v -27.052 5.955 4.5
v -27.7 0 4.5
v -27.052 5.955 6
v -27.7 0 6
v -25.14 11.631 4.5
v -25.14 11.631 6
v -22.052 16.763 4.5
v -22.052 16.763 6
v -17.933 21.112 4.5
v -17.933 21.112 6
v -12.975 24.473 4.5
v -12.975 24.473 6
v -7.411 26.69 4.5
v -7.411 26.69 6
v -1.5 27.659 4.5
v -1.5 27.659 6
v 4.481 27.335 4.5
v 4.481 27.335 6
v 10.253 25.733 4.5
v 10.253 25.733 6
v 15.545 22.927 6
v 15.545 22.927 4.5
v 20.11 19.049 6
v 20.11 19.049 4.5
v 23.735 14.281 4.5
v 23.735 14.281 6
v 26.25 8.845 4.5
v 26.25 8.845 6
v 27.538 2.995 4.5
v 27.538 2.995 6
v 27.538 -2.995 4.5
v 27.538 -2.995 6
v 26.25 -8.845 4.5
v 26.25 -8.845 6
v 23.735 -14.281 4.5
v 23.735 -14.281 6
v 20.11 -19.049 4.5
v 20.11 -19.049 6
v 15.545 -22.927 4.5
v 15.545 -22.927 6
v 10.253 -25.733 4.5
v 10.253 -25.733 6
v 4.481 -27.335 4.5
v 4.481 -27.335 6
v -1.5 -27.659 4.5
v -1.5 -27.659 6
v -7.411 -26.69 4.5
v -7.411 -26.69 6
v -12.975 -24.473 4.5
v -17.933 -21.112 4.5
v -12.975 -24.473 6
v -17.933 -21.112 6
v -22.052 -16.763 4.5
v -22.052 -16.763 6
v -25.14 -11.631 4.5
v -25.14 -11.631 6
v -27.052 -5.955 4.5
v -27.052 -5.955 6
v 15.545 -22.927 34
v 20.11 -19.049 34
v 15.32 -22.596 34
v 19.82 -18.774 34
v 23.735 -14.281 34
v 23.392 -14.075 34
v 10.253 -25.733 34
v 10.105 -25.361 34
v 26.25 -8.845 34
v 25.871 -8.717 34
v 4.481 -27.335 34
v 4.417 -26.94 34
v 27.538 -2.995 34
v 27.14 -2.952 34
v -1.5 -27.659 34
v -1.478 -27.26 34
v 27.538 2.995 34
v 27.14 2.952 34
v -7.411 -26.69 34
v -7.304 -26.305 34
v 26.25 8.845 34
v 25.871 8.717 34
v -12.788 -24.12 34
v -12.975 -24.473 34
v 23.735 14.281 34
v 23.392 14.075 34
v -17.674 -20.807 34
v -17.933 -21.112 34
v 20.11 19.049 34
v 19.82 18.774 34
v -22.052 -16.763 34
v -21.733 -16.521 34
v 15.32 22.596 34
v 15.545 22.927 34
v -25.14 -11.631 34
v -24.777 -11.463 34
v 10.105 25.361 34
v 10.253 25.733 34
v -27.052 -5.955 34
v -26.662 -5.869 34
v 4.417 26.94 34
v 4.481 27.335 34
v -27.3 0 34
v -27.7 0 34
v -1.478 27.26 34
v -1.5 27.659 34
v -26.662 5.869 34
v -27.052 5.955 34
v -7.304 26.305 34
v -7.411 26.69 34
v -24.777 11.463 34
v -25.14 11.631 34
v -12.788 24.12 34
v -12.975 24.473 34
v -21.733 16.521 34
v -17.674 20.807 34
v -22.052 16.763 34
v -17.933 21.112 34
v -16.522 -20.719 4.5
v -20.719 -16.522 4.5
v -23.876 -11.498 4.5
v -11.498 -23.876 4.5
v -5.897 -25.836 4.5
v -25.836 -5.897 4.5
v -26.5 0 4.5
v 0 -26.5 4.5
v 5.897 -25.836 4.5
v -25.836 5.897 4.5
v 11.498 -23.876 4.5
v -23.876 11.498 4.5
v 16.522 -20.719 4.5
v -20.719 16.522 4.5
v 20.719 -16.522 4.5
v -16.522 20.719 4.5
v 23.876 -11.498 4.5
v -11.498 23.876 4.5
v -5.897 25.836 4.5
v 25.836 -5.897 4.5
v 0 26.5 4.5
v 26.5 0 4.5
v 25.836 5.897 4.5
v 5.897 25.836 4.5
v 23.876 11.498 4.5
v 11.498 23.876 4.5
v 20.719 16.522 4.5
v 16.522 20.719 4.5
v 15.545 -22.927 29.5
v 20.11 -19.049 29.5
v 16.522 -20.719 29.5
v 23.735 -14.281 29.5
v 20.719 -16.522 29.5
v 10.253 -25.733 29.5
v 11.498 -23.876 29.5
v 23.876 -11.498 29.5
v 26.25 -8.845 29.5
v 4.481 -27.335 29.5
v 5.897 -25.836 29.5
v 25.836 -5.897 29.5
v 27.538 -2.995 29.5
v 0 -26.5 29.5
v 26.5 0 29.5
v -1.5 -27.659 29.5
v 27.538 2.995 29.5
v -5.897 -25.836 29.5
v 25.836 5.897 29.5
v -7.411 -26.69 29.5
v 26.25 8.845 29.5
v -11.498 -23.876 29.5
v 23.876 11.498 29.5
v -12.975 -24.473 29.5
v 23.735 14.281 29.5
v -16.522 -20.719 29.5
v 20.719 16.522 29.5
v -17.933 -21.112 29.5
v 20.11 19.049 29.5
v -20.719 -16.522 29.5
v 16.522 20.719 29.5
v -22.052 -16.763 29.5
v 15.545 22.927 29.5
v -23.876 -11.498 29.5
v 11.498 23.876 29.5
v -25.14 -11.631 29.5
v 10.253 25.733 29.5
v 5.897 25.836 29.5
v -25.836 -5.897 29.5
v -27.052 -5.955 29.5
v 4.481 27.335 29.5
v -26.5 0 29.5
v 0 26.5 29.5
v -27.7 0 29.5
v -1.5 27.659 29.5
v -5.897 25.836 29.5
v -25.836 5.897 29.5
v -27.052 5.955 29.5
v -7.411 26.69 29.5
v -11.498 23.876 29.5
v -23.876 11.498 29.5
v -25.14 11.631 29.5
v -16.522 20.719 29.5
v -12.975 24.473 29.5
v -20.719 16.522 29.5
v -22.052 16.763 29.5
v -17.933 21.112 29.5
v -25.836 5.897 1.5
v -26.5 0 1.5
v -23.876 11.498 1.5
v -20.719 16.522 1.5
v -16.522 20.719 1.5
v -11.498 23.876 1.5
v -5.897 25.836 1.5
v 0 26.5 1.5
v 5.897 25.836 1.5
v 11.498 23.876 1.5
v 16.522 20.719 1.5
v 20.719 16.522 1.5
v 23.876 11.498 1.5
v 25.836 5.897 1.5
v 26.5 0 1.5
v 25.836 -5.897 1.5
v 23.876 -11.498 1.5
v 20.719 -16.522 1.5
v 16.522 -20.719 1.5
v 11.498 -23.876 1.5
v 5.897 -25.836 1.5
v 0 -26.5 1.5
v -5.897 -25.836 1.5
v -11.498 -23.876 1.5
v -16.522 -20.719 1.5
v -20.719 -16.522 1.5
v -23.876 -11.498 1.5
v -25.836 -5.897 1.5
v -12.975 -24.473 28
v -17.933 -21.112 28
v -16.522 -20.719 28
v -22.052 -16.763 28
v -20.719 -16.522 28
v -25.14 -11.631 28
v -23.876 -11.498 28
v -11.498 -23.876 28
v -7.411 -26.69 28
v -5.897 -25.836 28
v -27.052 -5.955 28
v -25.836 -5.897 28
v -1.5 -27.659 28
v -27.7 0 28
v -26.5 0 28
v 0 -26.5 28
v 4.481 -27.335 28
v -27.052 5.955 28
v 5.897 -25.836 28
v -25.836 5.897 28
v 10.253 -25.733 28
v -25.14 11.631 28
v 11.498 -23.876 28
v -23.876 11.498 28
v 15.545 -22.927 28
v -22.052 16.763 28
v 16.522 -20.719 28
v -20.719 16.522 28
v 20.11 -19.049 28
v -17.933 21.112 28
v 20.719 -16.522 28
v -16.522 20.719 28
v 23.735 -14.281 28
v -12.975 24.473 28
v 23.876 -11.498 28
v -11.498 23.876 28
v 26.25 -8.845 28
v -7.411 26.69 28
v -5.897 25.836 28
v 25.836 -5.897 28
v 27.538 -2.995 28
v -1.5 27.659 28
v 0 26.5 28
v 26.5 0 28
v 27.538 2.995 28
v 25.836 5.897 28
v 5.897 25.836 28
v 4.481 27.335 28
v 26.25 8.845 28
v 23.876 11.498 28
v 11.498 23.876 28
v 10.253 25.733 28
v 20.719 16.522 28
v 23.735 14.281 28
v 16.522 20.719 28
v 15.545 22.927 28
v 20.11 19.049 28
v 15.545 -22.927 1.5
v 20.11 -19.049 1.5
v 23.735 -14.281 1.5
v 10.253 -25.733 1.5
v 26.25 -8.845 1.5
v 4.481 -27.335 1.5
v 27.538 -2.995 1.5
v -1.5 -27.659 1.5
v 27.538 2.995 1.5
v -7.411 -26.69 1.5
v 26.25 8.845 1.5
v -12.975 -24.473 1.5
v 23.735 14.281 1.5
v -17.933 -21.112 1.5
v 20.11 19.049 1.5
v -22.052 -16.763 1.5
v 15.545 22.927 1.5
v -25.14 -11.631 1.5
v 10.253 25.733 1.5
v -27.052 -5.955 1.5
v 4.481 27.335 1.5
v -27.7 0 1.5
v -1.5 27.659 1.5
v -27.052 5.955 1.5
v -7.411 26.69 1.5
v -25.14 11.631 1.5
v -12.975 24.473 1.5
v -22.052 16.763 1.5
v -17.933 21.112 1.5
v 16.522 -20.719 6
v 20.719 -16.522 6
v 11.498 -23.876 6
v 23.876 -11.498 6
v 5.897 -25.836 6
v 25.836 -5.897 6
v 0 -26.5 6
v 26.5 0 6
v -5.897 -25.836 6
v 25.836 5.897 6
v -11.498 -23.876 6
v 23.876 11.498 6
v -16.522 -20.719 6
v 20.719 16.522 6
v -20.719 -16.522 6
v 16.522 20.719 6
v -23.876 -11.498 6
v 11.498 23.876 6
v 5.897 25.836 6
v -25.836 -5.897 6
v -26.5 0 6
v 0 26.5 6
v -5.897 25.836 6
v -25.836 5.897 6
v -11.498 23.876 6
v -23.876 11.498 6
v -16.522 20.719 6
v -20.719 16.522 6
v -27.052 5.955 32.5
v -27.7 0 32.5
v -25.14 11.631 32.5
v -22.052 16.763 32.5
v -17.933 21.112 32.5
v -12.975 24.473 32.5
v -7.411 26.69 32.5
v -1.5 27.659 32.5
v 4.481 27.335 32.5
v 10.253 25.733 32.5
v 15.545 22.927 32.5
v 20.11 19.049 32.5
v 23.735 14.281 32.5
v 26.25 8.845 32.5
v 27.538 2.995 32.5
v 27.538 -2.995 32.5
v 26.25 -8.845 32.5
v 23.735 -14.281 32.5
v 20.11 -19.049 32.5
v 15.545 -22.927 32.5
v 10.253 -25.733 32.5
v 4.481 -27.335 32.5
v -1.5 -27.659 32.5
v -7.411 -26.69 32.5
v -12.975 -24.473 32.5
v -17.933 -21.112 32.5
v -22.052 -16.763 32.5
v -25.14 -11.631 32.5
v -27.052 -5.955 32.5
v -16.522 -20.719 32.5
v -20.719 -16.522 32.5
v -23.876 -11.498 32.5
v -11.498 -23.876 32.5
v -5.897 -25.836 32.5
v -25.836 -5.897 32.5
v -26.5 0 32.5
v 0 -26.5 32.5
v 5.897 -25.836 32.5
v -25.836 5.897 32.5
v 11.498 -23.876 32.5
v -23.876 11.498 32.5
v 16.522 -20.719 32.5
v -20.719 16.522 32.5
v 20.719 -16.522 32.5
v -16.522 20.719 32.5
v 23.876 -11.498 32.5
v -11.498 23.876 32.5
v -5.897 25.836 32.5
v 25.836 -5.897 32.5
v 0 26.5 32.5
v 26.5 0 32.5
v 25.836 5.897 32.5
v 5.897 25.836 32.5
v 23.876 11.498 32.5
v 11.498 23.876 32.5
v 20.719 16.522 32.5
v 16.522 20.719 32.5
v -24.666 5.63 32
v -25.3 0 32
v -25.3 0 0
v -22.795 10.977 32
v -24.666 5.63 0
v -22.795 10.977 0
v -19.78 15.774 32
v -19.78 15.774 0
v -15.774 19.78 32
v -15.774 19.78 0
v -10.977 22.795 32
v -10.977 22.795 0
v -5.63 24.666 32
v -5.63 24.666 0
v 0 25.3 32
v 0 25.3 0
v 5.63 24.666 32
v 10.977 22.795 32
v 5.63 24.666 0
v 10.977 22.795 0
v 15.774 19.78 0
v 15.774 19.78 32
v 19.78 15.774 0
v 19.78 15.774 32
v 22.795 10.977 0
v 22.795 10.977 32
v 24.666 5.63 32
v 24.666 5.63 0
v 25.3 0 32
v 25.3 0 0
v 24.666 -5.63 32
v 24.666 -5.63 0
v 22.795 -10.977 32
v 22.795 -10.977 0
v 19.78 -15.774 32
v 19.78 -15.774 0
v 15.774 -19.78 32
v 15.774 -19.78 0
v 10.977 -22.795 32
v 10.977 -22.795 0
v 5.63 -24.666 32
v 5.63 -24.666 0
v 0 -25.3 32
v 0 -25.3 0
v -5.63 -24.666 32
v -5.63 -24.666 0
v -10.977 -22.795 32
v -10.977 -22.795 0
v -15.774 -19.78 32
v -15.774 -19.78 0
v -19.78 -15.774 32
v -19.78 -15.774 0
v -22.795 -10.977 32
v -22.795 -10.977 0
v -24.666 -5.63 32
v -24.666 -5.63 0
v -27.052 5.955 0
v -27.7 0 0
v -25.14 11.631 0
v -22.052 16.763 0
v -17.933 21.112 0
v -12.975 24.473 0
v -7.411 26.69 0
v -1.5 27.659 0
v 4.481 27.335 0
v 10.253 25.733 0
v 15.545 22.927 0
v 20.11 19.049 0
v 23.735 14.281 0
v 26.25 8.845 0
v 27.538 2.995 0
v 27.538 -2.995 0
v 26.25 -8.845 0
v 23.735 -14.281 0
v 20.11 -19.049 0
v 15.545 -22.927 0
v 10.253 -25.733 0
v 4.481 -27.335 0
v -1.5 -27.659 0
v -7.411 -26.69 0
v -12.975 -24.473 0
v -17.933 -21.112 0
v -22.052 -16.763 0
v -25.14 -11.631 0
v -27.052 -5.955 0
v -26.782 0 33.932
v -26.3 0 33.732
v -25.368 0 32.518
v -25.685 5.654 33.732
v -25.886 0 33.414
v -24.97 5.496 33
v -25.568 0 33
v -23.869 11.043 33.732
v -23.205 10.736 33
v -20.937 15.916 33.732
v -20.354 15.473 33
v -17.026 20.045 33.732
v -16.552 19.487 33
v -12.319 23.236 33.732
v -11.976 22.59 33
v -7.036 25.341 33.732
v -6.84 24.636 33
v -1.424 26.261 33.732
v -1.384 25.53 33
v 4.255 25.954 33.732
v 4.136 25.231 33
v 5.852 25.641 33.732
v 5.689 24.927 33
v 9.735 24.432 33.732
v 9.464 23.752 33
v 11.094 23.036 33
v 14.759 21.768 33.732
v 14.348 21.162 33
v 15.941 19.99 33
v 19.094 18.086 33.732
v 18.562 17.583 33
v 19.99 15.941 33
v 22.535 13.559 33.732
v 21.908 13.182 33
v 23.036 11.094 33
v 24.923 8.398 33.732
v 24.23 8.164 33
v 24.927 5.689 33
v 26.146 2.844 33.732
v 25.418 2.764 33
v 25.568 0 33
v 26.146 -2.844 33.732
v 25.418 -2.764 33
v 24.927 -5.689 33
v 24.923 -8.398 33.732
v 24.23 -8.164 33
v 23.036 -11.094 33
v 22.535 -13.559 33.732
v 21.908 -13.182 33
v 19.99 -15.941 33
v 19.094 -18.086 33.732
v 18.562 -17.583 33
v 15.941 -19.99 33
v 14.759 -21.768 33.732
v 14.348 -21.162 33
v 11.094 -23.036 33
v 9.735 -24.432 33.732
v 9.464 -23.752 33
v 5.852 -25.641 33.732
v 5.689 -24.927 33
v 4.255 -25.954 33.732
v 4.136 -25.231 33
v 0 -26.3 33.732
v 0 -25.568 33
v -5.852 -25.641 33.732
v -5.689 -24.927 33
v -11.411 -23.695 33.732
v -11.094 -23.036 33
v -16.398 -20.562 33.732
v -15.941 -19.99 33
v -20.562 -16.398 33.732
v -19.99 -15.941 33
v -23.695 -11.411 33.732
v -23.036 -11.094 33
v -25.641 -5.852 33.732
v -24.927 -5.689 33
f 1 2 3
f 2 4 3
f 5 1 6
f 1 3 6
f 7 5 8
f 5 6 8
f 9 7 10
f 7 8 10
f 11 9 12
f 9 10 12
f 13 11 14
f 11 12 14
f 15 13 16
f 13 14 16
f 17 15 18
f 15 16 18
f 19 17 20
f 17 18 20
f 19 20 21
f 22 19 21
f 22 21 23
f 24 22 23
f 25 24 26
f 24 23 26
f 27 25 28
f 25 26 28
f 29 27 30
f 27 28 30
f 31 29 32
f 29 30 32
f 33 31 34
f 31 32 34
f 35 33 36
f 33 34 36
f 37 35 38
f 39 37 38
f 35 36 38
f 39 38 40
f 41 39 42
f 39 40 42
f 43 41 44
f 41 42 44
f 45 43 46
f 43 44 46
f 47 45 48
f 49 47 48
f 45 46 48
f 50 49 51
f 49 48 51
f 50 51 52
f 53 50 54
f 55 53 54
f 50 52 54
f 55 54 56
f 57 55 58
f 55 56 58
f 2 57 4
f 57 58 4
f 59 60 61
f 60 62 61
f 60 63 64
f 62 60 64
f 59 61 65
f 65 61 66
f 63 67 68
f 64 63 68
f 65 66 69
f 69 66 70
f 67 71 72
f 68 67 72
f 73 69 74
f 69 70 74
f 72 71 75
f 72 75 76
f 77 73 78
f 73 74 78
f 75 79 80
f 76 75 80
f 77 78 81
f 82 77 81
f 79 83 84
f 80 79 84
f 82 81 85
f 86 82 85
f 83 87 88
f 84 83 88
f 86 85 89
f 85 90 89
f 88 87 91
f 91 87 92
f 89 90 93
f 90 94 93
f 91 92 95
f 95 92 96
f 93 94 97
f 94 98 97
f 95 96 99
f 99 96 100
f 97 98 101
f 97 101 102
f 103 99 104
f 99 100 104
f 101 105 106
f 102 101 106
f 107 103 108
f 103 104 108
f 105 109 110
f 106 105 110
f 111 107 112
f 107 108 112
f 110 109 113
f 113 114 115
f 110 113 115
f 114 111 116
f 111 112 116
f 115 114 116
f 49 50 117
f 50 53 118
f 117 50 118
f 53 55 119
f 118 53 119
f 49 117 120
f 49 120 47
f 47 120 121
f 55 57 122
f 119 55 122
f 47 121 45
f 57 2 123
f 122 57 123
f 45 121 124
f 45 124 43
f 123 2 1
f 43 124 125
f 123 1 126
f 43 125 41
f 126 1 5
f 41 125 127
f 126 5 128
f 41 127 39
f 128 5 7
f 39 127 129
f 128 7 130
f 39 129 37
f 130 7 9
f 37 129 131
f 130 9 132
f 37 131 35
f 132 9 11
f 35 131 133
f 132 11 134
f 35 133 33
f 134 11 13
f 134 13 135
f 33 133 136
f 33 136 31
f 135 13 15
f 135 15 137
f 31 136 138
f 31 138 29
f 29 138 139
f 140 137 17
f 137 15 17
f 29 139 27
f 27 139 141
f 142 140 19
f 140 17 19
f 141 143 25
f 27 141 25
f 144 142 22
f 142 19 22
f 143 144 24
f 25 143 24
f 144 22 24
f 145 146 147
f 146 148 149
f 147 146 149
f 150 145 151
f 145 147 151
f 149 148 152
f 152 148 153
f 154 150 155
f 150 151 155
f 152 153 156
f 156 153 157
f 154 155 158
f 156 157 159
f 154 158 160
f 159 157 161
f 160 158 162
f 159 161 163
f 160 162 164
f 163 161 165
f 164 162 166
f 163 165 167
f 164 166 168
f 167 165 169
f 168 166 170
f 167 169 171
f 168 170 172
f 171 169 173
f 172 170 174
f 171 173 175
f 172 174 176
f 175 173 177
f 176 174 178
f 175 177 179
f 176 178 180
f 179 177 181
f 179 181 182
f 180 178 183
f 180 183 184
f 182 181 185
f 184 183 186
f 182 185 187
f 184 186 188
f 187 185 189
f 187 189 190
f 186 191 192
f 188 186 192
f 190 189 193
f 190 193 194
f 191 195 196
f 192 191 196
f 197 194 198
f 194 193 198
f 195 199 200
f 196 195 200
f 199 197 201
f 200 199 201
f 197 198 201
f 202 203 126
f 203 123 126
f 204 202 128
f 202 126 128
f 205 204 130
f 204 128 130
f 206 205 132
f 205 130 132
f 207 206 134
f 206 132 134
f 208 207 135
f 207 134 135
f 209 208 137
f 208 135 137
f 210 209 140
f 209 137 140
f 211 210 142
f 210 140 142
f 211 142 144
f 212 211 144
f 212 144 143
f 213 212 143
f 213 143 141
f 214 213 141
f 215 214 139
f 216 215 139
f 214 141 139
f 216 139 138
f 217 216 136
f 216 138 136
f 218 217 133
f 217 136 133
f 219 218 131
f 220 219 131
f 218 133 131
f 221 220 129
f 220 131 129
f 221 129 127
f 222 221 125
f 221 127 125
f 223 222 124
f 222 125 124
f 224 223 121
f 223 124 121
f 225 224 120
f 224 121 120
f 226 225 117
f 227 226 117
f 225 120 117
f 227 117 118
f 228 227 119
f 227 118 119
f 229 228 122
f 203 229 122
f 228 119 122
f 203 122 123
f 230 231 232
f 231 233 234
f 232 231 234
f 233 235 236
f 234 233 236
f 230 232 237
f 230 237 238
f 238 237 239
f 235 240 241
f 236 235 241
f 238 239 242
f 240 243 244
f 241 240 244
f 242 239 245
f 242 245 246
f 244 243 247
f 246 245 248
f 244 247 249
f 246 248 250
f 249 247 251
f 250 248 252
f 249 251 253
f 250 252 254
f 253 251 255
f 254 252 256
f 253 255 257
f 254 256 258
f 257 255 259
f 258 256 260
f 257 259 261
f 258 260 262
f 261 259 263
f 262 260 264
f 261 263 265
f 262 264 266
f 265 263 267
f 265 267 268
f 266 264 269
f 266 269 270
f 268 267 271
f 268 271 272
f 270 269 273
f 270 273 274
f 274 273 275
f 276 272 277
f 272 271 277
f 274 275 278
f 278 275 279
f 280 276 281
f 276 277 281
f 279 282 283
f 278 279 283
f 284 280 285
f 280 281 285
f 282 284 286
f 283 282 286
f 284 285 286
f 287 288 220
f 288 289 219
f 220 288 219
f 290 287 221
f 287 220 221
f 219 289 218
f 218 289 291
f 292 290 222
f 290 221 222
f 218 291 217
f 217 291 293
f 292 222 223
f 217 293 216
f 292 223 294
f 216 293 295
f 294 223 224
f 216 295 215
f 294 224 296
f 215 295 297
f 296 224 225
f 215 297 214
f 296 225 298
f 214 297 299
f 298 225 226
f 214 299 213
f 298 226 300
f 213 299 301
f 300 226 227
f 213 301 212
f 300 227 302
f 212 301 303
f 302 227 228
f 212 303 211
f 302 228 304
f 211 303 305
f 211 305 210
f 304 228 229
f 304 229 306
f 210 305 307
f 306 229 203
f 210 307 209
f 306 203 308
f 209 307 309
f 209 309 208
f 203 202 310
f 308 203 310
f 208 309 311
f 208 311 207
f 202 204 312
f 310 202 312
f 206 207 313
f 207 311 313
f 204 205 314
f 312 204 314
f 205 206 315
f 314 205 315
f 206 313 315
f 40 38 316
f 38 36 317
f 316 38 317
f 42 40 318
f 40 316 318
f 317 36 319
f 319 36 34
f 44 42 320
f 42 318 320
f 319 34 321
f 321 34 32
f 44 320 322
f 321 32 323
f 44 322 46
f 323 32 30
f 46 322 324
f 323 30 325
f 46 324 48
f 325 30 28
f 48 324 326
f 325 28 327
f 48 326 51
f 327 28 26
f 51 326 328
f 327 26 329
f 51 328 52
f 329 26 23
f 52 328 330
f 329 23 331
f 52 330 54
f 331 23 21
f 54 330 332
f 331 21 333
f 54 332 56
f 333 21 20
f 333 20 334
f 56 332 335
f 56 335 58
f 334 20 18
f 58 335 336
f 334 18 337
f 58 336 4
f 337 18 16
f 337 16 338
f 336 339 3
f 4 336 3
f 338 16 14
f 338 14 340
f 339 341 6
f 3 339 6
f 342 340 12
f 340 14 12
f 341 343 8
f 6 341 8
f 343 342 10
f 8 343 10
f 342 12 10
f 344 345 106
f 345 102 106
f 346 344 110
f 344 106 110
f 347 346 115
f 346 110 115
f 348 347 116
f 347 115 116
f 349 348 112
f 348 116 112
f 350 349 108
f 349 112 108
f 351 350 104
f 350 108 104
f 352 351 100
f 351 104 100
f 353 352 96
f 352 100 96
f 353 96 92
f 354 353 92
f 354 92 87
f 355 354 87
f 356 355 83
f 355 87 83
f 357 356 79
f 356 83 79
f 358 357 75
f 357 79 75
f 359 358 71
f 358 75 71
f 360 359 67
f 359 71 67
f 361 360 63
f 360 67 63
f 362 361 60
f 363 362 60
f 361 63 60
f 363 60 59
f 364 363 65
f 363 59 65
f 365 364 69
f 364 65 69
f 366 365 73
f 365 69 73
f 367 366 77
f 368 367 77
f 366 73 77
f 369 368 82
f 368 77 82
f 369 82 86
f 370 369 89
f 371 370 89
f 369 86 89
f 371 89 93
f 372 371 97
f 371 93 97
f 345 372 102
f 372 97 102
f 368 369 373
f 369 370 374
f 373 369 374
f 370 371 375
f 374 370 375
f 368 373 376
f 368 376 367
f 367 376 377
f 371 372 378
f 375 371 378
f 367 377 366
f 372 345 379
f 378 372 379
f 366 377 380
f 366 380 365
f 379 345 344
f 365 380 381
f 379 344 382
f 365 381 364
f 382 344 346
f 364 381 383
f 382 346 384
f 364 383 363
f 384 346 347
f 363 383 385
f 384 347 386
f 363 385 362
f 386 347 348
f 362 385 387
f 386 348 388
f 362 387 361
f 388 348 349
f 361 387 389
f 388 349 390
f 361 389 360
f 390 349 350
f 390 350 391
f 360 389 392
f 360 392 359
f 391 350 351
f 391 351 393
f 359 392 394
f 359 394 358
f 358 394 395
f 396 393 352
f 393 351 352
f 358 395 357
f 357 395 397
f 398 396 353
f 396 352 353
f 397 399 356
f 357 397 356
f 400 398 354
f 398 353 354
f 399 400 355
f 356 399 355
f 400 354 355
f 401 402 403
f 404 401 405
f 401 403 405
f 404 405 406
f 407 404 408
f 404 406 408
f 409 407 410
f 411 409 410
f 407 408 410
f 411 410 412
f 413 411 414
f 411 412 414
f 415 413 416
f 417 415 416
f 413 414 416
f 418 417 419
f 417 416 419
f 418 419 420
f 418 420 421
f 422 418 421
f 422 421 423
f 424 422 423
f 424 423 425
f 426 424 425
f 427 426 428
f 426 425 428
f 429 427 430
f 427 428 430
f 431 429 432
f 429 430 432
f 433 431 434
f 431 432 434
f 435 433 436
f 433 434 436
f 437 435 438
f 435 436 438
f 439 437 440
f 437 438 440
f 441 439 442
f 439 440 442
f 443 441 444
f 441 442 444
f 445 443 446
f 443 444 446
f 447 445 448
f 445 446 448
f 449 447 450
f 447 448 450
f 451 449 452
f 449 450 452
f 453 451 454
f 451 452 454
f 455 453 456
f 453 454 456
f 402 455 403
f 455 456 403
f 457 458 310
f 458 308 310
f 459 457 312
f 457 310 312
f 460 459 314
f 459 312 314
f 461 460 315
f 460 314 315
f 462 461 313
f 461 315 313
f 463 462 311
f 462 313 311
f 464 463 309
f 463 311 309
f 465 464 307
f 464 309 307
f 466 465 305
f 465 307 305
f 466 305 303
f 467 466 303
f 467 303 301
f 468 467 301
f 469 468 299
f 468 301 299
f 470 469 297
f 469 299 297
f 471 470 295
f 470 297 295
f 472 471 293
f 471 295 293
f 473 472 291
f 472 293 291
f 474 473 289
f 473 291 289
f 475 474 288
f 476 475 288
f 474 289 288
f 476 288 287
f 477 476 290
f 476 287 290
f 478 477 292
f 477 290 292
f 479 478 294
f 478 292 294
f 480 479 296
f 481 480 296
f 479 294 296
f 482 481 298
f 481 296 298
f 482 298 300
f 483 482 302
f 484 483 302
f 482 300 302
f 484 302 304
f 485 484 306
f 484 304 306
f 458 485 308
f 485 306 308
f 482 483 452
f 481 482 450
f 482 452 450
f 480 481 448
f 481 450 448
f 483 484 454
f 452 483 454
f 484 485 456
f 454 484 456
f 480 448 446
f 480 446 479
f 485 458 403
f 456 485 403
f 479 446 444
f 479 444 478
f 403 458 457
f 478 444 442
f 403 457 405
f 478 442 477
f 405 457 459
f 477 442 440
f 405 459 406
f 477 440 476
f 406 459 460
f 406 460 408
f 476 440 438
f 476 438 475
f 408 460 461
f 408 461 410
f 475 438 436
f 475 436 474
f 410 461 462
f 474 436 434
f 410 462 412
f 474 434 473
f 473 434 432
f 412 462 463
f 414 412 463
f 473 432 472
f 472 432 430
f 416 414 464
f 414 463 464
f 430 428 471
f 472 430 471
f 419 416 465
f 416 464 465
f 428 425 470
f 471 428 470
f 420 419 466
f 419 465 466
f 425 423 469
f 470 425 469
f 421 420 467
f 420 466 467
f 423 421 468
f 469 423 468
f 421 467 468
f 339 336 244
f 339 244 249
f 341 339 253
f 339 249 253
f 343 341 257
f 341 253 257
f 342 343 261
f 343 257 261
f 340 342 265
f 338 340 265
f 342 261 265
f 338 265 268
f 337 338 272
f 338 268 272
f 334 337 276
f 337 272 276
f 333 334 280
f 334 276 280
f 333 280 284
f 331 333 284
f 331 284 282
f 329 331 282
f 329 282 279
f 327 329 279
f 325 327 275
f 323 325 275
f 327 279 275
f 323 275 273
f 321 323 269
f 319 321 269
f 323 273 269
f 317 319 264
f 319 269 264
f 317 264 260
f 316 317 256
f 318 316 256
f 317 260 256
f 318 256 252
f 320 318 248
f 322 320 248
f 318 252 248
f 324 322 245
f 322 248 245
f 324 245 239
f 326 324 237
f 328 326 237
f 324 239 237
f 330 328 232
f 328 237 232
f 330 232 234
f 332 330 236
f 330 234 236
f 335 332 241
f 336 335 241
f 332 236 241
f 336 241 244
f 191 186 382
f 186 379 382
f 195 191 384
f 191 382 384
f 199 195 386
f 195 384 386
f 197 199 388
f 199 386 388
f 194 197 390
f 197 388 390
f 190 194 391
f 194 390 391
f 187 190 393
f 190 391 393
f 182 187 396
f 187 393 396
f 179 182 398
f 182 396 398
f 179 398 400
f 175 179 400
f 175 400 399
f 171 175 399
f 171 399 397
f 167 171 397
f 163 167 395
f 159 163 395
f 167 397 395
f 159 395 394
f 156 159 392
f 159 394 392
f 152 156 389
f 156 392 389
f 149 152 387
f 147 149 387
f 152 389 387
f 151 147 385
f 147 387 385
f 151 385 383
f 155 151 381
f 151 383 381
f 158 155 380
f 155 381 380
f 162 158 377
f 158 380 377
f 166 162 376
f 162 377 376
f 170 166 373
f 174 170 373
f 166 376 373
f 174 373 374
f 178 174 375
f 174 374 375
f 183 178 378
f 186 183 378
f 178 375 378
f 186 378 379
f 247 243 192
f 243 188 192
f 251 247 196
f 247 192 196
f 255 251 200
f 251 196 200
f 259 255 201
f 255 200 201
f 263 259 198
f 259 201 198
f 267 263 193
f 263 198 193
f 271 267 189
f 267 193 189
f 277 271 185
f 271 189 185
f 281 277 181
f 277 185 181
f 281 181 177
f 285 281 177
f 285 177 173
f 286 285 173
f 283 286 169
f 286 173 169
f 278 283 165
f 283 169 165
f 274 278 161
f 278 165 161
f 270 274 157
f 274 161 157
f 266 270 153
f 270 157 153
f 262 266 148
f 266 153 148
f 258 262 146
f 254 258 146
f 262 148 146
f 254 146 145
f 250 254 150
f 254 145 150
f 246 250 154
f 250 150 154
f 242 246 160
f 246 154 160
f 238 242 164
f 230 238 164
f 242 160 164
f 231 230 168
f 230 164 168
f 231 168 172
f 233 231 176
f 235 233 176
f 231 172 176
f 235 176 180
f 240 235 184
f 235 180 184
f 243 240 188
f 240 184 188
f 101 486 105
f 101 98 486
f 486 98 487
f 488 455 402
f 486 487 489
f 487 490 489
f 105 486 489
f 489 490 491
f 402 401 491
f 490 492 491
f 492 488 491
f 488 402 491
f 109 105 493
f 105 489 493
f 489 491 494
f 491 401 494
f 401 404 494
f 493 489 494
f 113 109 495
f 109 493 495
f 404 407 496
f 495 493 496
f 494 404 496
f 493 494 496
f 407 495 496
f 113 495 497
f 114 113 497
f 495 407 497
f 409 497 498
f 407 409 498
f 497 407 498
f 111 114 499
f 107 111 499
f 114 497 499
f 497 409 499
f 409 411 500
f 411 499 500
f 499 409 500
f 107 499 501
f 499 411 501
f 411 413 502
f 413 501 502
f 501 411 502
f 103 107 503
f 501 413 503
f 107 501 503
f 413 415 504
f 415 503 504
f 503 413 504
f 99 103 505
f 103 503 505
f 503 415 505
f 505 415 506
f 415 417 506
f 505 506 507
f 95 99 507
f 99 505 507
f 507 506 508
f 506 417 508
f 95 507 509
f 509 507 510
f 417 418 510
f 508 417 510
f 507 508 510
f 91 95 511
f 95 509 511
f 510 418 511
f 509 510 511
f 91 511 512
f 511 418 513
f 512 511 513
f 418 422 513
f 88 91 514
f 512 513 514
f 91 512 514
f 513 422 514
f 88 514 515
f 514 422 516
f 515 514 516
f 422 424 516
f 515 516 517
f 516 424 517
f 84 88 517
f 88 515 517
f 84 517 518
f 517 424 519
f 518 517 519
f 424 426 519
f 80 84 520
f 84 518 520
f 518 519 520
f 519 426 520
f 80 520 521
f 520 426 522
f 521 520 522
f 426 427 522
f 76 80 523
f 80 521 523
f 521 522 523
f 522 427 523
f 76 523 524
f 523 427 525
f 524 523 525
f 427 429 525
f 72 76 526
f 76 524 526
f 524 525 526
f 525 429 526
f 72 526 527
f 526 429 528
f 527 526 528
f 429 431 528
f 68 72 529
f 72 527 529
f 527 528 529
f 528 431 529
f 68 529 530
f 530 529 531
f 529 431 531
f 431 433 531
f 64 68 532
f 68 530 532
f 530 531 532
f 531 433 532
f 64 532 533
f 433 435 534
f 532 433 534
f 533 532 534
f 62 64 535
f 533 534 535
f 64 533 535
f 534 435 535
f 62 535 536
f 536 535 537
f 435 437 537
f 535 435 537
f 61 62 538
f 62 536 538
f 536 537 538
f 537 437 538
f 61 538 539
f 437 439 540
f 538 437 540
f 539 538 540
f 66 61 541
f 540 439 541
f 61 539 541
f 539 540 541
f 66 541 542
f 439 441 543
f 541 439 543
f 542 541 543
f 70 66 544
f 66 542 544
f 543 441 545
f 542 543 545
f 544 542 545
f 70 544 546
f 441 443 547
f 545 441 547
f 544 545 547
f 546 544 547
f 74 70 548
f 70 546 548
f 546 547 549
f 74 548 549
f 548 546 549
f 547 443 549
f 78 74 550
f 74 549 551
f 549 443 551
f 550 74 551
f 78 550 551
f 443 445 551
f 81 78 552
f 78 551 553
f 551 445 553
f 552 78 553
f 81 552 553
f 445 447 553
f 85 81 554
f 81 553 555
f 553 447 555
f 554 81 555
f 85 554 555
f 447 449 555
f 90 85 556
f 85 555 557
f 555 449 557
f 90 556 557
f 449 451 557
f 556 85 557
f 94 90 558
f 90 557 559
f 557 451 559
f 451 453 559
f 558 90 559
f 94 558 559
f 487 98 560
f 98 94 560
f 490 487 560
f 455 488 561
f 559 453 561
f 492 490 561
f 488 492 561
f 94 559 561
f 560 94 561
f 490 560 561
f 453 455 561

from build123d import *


with BuildPart() as part:
    # Sketch1 → Revolve1 (revolve)
    with BuildSketch(Plane.XZ, mode=Mode.PRIVATE) as revolve1_sk:
        with BuildLine():
            Line((25.3, 0), (27.7, 0))
            Line((27.7, 0), (27.7, 1.5))
            Line((27.7, 1.5), (26.5, 1.5))
            Line((26.5, 1.5), (26.5, 4.5))
            Line((26.5, 4.5), (27.7, 4.5))
            Line((27.7, 4.5), (27.7, 6))
            Line((27.7, 6), (26.5, 6))
            Line((26.5, 6), (26.5, 28))
            Line((26.5, 28), (27.7, 28))
            Line((27.7, 28), (27.7, 29.5))
            Line((27.7, 29.5), (26.5, 29.5))
            Line((26.5, 29.5), (26.5, 32.5))
            Line((26.5, 32.5), (27.7, 32.5))
            Line((27.7, 32.5), (27.7, 34))
            Line((27.7, 34), (27.3, 34))
            ThreePointArc((27.3, 34), (25.885786438, 33.414213562), (25.3, 32))
            Line((25.3, 32), (25.3, 0))
        make_face()
    revolve(revolve1_sk.sketch.rotate(Axis((0, 0, 34), (0, 0, -1)), 180), axis=Axis((0, 0, 34), (0, 0, -1)))


solid = part.part
